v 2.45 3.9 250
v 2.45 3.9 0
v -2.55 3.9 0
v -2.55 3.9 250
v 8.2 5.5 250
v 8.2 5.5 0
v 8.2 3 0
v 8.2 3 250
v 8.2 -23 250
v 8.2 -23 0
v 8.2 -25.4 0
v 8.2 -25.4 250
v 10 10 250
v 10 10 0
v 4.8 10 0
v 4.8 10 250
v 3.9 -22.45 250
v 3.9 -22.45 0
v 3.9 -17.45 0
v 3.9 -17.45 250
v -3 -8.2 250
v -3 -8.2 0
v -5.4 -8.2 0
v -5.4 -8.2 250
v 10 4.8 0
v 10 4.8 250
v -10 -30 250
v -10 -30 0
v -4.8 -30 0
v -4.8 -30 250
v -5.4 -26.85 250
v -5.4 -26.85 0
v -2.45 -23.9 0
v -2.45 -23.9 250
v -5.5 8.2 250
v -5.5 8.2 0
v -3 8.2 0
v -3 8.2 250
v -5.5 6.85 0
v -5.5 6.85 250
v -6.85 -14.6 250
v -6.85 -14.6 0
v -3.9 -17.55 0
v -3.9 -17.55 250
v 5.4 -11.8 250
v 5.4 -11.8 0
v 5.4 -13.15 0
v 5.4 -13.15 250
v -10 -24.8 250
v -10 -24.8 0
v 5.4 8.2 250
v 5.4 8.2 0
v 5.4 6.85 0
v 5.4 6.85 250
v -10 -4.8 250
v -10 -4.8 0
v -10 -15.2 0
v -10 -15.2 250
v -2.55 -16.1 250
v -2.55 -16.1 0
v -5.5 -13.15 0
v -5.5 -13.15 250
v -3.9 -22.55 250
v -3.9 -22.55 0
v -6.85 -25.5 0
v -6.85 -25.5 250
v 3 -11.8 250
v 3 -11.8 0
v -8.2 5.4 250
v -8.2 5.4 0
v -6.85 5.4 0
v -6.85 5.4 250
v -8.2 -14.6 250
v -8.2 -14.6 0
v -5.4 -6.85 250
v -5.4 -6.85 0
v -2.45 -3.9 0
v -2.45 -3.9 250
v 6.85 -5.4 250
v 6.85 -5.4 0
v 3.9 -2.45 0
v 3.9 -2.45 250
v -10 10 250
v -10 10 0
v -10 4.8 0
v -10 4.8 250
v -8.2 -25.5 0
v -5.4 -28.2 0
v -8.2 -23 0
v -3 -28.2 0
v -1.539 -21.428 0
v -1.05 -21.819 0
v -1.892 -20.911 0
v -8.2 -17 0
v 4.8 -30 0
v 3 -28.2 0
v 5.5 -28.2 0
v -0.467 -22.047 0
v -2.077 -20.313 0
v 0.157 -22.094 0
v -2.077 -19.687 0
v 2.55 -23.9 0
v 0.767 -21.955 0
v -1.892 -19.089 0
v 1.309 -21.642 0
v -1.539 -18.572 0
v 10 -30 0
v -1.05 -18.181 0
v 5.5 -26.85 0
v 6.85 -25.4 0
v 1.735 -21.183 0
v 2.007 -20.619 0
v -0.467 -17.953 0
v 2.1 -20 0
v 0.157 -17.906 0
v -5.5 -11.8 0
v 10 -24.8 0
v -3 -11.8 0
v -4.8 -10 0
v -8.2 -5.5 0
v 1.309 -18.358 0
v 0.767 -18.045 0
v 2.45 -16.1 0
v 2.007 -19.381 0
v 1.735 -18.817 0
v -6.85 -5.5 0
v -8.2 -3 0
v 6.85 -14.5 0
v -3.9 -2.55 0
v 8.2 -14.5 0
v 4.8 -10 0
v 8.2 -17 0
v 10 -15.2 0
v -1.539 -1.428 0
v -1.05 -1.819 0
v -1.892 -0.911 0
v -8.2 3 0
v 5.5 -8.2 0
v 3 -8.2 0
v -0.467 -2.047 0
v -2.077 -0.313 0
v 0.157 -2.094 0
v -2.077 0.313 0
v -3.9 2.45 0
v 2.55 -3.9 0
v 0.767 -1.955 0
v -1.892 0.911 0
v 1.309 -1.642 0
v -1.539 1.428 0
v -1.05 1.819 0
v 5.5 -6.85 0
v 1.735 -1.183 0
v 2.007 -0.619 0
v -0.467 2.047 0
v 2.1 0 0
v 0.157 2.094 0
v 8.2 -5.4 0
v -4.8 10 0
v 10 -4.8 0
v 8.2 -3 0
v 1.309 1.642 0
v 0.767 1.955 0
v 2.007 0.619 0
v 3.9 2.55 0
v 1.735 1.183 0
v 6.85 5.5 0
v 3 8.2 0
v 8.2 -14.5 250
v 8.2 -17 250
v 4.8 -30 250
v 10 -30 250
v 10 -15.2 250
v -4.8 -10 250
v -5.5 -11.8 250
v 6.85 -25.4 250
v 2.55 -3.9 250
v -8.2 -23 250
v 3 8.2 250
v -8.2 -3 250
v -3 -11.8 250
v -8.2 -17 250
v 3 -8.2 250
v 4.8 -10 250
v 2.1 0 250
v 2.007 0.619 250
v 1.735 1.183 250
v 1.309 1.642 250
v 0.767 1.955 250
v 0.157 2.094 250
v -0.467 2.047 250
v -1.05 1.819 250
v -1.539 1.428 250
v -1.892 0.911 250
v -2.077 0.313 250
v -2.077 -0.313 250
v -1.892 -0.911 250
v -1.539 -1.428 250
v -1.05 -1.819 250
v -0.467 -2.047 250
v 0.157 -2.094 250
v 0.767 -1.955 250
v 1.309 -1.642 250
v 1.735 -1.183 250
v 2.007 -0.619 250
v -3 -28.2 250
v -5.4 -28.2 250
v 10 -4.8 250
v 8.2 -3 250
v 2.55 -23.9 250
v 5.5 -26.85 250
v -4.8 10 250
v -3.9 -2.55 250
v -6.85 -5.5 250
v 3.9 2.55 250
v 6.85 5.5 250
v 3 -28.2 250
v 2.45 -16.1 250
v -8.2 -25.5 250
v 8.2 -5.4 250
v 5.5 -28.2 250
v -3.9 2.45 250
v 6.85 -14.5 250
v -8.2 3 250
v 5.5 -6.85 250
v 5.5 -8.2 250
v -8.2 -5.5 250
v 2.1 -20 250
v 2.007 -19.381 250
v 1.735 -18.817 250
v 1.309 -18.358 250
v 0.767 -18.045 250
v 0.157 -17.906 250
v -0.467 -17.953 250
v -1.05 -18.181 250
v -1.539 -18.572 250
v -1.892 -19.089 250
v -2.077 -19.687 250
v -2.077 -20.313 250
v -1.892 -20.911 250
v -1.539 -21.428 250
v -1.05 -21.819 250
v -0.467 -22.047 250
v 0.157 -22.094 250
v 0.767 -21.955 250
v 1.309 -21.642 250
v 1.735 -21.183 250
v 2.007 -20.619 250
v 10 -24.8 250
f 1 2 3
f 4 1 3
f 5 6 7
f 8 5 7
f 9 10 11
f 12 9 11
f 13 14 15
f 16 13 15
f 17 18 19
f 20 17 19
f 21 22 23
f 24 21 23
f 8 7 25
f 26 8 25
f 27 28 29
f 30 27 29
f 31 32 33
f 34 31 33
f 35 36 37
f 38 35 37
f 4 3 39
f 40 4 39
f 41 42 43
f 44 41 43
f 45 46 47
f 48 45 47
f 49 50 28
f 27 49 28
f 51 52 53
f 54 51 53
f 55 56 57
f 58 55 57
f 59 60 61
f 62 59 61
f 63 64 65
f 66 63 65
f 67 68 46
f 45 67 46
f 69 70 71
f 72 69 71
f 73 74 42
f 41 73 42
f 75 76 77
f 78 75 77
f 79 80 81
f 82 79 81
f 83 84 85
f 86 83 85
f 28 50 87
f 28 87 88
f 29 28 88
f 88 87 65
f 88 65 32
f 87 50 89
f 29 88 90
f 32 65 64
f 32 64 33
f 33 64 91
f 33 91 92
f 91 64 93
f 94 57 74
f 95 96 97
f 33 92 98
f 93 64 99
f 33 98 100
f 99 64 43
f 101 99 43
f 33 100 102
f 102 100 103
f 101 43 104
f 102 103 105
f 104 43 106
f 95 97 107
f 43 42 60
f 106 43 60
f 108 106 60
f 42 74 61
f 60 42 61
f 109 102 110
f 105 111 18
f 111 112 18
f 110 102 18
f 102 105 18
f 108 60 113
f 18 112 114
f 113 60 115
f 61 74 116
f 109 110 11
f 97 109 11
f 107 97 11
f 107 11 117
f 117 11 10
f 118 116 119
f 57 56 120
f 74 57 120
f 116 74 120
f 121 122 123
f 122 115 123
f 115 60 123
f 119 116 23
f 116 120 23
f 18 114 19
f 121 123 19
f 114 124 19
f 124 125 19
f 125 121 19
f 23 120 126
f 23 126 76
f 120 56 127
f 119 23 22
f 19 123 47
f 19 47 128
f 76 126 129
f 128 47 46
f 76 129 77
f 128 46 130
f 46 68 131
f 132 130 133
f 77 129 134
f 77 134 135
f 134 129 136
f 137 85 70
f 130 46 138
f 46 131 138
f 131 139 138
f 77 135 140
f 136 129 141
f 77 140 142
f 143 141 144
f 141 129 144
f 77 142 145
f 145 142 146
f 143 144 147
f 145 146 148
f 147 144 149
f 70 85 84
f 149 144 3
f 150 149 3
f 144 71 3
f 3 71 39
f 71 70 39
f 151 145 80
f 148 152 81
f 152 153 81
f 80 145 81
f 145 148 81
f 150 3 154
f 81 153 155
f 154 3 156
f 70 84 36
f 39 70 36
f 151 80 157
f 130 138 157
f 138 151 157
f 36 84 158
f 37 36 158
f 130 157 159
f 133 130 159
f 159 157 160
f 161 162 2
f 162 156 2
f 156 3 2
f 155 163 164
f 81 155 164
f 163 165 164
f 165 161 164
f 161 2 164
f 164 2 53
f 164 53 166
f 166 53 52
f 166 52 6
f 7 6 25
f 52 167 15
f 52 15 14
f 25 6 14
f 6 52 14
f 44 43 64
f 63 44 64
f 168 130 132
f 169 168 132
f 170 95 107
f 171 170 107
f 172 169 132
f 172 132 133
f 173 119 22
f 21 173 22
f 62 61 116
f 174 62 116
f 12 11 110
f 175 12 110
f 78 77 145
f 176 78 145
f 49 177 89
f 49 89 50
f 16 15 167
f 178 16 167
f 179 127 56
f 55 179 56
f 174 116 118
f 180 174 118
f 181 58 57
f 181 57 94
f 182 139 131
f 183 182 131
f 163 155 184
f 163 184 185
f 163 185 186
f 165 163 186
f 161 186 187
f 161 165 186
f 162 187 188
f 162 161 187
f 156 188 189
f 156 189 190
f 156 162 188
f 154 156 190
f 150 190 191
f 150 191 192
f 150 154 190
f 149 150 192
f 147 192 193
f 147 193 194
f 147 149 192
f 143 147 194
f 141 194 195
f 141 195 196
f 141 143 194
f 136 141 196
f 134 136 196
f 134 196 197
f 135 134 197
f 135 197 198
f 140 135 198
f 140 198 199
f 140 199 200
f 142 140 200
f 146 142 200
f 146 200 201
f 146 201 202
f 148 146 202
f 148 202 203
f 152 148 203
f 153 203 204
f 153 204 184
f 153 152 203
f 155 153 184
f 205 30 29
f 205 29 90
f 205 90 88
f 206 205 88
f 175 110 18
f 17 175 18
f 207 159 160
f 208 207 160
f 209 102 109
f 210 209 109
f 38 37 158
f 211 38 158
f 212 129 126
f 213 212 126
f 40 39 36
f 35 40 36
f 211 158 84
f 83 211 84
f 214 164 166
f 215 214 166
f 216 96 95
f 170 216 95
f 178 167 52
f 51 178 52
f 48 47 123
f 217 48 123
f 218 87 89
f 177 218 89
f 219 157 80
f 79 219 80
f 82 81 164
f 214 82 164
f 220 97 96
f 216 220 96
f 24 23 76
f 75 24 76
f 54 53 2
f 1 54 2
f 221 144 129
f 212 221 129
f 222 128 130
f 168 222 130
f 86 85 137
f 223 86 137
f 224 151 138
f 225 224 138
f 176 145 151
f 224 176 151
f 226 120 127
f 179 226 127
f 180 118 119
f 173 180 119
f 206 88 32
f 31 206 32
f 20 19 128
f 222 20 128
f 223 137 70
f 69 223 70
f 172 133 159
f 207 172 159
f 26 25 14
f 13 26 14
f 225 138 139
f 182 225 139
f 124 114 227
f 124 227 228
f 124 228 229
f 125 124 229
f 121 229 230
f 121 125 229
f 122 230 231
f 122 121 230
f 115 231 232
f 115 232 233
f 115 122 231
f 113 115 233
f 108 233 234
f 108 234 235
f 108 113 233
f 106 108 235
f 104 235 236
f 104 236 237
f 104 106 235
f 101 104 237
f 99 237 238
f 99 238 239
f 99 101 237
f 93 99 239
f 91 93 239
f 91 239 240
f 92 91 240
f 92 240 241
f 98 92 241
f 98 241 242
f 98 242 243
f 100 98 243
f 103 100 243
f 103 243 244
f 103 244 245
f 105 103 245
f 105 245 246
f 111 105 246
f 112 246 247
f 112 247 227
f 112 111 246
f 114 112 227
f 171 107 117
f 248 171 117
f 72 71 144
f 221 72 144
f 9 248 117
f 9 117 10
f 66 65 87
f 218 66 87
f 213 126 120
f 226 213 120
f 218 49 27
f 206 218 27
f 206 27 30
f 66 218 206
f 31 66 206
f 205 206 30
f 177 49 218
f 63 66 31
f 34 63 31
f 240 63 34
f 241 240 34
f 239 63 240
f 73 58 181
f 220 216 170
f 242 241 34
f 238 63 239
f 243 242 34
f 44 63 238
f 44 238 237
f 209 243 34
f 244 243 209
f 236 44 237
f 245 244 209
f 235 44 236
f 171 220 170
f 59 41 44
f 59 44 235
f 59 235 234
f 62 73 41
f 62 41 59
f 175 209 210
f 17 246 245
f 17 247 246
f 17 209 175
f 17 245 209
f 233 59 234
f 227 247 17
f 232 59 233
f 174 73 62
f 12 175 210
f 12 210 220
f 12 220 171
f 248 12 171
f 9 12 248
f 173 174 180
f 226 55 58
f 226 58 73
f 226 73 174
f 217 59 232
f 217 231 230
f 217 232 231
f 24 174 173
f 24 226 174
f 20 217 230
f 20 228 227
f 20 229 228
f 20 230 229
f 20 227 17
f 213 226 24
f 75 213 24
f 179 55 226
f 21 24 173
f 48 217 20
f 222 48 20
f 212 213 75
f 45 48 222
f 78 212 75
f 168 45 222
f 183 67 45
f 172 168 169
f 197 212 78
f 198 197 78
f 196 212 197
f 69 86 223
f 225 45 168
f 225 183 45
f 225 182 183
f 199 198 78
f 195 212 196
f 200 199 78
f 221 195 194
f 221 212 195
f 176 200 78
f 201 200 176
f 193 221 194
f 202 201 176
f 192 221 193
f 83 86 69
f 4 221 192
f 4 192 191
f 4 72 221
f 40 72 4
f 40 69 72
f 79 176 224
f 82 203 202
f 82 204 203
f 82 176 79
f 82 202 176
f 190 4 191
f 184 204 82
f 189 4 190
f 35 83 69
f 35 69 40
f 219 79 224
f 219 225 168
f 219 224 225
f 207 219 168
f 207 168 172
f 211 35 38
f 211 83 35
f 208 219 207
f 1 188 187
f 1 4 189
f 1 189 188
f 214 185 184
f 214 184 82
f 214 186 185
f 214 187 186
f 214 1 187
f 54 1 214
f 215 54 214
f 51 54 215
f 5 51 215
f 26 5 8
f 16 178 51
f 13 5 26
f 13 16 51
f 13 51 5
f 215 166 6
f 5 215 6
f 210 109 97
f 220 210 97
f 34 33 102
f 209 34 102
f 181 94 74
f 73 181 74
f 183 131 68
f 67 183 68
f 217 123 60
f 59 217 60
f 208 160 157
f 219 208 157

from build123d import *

# Parameters (mm, degrees)
CROQUIS1_R              = 2.1
SALIENTE_EXTRUIR1_DEPTH = 250
MATRIZL1_COUNT          = 2
MATRIZL1_PITCH          = 20


with BuildPart() as part:
    # Croquis1 → Saliente-Extruir1 (new body)
    with BuildSketch(Plane.XY):
        Polygon((3, 8.2), (5.4, 8.2), (5.4, 6.85), (2.45, 3.9), (-2.55, 3.9), (-5.5, 6.85), (-5.5, 8.2), (-3, 8.2), (-4.8, 10), (-10, 10), (-10, 4.8), (-8.2, 3), (-8.2, 5.4), (-6.85, 5.4), (-3.9, 2.45), (-3.9, -2.55), (-6.85, -5.5), (-8.2, -5.5), (-8.2, -3), (-10, -4.8), (-10, -10), (-4.8, -10), (-3, -8.2), (-5.4, -8.2), (-5.4, -6.85), (-2.45, -3.9), (2.55, -3.9), (5.5, -6.85), (5.5, -8.2), (3, -8.2), (4.8, -10), (10, -10), (10, -4.8), (8.2, -3), (8.2, -5.4), (6.85, -5.4), (3.9, -2.45), (3.9, 2.55), (6.85, 5.5), (8.2, 5.5), (8.2, 3), (10, 4.8), (10, 10), (4.8, 10), align=None)
        Circle(CROQUIS1_R, mode=Mode.SUBTRACT)
    saliente_extruir1 = extrude(amount=SALIENTE_EXTRUIR1_DEPTH)

    # MatrizL1: Saliente-Extruir1 ×2
    with Locations(*[(0, -i * MATRIZL1_PITCH, 0) for i in range(1, MATRIZL1_COUNT)]):
        add(saliente_extruir1)


solid = part.part
